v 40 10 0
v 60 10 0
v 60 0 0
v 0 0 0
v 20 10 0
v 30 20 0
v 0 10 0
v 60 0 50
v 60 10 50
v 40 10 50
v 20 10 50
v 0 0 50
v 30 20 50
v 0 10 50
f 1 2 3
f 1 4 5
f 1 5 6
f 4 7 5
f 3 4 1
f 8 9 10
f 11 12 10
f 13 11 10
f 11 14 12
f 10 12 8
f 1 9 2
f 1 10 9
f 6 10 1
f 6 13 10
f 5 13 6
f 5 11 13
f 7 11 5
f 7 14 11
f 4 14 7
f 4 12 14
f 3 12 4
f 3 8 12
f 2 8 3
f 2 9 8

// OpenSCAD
$fn = 32;

// ----------------------------------------------------------------------
// V guide rail: vrib, 60 mm wide
// ----------------------------------------------------------------------

// --- parameters (mm) ---
rail_w = 60;              // rail width, X
base_t = 10;              // base plate thickness
v_depth = 10;             // V feature depth / height
v_half_w = 10;            // half width of the V at the base face
plate_t = 50;             // rail length, Z (the extrusion height)

profile = [[0, 0], [60, 0], [60, 10], [40, 10], [30, 20], [20, 10], [0, 10]];  // primary outline, 7 points, counter clockwise

// --- the one profile operation ---
linear_extrude(height = plate_t) polygon(points = profile);
